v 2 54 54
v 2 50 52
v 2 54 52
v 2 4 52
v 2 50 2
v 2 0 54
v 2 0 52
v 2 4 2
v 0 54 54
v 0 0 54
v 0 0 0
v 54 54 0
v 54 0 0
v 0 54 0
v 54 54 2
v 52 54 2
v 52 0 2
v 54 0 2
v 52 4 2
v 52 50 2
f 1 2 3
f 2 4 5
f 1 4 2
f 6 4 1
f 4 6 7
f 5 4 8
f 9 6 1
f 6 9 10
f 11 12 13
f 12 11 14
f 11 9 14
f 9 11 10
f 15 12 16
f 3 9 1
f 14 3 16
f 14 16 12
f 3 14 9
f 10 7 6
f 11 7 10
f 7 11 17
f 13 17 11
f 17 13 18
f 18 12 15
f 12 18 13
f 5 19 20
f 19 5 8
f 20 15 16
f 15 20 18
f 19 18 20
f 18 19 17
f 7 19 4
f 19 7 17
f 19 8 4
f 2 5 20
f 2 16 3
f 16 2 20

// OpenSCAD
kb=25+2; //Klebeband
t=2;
w=kb*2;
h=kb*2;
wd=t*2;

module seite()
{
cube([t,w,h]);
}

seite();

module oben()
{
cube([h,w,t]);
}

oben();

module winkel()
{
rotate([270,270,0])
color("yellow")
linear_extrude(wd)
polygon([[0,0],[h,0],[0,h]]);
}

winkel();

translate([0,w-wd,0])
winkel();
